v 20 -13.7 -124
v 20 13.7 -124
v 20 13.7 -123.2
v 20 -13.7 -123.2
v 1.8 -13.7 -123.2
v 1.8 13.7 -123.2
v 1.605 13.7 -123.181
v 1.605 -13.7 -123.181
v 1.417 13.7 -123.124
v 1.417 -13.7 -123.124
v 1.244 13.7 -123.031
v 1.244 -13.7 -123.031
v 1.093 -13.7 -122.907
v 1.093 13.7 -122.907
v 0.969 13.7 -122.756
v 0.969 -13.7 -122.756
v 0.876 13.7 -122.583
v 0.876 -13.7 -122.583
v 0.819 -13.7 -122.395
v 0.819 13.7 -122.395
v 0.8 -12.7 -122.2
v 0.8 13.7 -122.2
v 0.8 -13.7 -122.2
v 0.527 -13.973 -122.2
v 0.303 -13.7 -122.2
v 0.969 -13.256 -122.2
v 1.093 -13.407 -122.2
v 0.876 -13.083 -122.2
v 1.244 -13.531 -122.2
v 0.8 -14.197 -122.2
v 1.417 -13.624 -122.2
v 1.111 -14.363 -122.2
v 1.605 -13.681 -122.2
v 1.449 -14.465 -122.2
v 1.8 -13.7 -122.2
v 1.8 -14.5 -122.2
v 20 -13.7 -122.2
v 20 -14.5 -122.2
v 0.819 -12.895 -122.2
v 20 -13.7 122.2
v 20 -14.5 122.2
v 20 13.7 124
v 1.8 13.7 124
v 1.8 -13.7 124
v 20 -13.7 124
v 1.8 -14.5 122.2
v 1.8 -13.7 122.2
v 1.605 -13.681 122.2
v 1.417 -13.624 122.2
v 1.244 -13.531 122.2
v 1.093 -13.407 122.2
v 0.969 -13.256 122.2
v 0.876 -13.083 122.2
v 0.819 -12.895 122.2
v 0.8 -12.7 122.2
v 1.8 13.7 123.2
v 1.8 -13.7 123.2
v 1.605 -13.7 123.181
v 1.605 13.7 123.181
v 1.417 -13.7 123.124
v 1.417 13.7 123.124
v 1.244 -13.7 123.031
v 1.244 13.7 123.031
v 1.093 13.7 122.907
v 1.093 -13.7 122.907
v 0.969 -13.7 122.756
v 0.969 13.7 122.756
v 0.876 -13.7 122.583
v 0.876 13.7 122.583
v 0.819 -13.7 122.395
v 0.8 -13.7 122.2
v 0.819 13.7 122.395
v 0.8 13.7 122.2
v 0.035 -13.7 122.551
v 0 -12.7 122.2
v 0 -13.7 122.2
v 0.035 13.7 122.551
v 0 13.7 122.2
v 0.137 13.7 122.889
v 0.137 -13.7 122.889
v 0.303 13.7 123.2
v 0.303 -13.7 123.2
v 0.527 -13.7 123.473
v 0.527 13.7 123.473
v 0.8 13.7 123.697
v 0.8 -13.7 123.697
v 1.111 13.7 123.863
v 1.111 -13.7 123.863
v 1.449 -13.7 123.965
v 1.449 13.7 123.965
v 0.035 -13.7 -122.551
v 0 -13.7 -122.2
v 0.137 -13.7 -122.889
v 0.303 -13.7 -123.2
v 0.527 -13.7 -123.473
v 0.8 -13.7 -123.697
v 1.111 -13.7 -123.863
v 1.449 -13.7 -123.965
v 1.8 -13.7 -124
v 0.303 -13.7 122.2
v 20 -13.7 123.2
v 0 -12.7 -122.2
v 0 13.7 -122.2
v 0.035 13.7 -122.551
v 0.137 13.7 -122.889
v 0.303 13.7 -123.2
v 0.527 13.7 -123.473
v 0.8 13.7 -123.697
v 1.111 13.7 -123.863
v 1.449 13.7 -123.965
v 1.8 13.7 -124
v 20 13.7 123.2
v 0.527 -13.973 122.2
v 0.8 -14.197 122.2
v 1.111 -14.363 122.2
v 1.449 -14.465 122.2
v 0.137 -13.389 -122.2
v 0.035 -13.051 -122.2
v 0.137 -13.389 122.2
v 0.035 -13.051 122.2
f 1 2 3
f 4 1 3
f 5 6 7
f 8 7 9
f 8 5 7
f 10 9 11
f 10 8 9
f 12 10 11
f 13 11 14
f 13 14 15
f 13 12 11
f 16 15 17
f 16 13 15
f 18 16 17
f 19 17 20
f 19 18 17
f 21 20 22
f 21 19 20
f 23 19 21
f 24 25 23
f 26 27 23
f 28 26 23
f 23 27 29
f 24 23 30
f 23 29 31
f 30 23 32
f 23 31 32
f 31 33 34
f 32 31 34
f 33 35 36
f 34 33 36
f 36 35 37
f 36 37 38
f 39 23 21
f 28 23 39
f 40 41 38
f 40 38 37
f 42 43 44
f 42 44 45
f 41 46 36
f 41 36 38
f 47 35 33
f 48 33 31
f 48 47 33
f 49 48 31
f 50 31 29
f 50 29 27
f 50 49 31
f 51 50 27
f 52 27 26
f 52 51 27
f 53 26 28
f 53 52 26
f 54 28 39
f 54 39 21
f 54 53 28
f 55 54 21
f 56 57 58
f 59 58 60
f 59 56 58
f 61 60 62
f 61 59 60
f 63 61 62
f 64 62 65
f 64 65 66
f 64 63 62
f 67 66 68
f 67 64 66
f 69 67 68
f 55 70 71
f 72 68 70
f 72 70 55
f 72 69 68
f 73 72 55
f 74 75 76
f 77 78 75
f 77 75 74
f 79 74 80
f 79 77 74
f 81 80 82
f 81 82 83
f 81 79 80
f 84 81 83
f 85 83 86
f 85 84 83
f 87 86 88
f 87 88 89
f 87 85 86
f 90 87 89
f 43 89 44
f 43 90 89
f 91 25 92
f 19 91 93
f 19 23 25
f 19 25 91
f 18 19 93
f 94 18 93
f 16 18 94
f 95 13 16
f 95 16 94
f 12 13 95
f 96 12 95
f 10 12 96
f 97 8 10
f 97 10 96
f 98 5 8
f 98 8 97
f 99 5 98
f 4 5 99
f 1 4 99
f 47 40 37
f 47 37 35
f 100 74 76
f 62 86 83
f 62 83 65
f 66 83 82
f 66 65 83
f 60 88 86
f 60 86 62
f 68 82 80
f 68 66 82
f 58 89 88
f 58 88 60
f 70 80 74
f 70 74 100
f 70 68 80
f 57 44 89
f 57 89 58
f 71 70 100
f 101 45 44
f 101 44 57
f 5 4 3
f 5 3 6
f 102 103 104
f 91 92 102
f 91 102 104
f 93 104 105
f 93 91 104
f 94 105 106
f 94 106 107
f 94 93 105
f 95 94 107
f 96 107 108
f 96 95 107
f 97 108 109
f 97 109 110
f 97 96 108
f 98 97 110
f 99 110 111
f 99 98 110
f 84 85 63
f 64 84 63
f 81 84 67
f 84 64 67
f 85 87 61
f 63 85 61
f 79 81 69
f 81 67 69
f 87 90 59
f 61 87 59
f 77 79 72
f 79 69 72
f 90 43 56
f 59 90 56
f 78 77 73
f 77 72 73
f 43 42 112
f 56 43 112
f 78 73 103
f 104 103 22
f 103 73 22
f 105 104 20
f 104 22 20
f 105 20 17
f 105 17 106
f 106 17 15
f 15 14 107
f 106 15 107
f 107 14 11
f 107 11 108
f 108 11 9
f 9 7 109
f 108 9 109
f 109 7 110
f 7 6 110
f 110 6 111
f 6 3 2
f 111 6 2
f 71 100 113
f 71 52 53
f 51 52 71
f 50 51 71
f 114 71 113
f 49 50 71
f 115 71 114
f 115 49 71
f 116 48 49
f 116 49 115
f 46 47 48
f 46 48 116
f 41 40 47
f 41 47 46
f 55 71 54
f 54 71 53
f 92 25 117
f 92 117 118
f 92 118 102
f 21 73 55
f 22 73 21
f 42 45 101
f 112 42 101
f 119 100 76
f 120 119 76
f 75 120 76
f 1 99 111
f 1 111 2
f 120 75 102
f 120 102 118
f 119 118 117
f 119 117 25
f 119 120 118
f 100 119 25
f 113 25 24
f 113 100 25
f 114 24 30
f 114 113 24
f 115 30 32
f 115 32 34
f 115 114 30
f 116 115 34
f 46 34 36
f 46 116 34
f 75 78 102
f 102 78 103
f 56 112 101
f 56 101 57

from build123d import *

# Parameters (mm, degrees)
SKETCH2_W                    = 246.4
SKETCH2_H                    = 27.4
BASE_FLANGE2_DEPTH           = 0.8
EDGE_FLANGE1_STRIP_W         = 5.2
EDGE_FLANGE1_STRIP_H         = 0.8
EDGE_FLANGE1_STRIP_CUT_DEPTH = 27.4
EDGE_FLANGE1_DEPTH           = 27.4
EDGE_FLANGE2_STRIP_W         = 5.2
EDGE_FLANGE2_STRIP_H         = 0.8
EDGE_FLANGE2_STRIP_CUT_DEPTH = 27.4
EDGE_FLANGE2_DEPTH           = 27.4
EDGE_FLANGE3_STRIP_W         = 5.2
EDGE_FLANGE3_STRIP_H         = 0.8
EDGE_FLANGE3_STRIP_CUT_DEPTH = 244.4
EDGE_FLANGE3_DEPTH           = 244.4


# Sheet-metal steps are written as plain solids
with BuildPart() as part:
    # Sketch2 → Base-Flange2 (new body)
    with BuildSketch(Plane(origin=(0, 0, 0), x_dir=(0, 0, -1), z_dir=(1, 0, 0))):
        Rectangle(SKETCH2_W, SKETCH2_H)
    extrude(amount=BASE_FLANGE2_DEPTH)

    # Edge-Flange1 strip (across the edge) → Edge-Flange1 strip cut (cut)
    with BuildSketch(Plane(origin=(0.8, 13.7, 123.2), x_dir=(0, 0, -1), z_dir=(0, -1, 0))):
        with Locations((-1.6, -0.4)):
            Rectangle(EDGE_FLANGE1_STRIP_W, EDGE_FLANGE1_STRIP_H)
    extrude(amount=EDGE_FLANGE1_STRIP_CUT_DEPTH, mode=Mode.SUBTRACT)

    # Edge-Flange1 section (across the edge) → Edge-Flange1 (add)
    with BuildSketch(Plane(origin=(0.8, 13.7, 123.2), x_dir=(0, 0, -1), z_dir=(0, -1, 0))):
        with BuildLine():
            Line((-0.8, 1), (-0.8, 19.2))
            Line((-0.8, 19.2), (0, 19.2))
            Line((0, 19.2), (0, 1))
            ThreePointArc((0, 1), (0.292893219, 0.292893219), (1, 0))
            Line((1, 0), (1, -0.8))
            ThreePointArc((1, -0.8), (-0.272792206, -0.272792206), (-0.8, 1))
        make_face()
    extrude(amount=EDGE_FLANGE1_DEPTH)

    # Edge-Flange2 strip (across the edge) → Edge-Flange2 strip cut (cut)
    with BuildSketch(Plane(origin=(0.8, -13.7, -123.2), x_dir=(0, 0, 1), z_dir=(0, 1, 0))):
        with Locations((-1.6, -0.4)):
            Rectangle(EDGE_FLANGE2_STRIP_W, EDGE_FLANGE2_STRIP_H)
    extrude(amount=EDGE_FLANGE2_STRIP_CUT_DEPTH, mode=Mode.SUBTRACT)

    # Edge-Flange2 section (across the edge) → Edge-Flange2 (add)
    with BuildSketch(Plane(origin=(0.8, -13.7, -123.2), x_dir=(0, 0, 1), z_dir=(0, 1, 0))):
        with BuildLine():
            Line((-0.8, 1), (-0.8, 19.2))
            Line((-0.8, 19.2), (0, 19.2))
            Line((0, 19.2), (0, 1))
            ThreePointArc((0, 1), (0.292893219, 0.292893219), (1, 0))
            Line((1, 0), (1, -0.8))
            ThreePointArc((1, -0.8), (-0.272792206, -0.272792206), (-0.8, 1))
        make_face()
    extrude(amount=EDGE_FLANGE2_DEPTH)

    # Edge-Flange3 strip (across the edge) → Edge-Flange3 strip cut (cut)
    with BuildSketch(Plane(origin=(0.8, -13.7, 122.2), x_dir=(0, 1, 0), z_dir=(0, 0, -1))):
        with Locations((-1.6, -0.4)):
            Rectangle(EDGE_FLANGE3_STRIP_W, EDGE_FLANGE3_STRIP_H)
    extrude(amount=EDGE_FLANGE3_STRIP_CUT_DEPTH, mode=Mode.SUBTRACT)

    # Edge-Flange3 section (across the edge) → Edge-Flange3 (add)
    with BuildSketch(Plane(origin=(0.8, -13.7, 122.2), x_dir=(0, 1, 0), z_dir=(0, 0, -1))):
        with BuildLine():
            Line((-0.8, 1), (-0.8, 19.2))
            Line((-0.8, 19.2), (0, 19.2))
            Line((0, 19.2), (0, 1))
            ThreePointArc((0, 1), (0.292893219, 0.292893219), (1, 0))
            Line((1, 0), (1, -0.8))
            ThreePointArc((1, -0.8), (-0.272792206, -0.272792206), (-0.8, 1))
        make_face()
    extrude(amount=EDGE_FLANGE3_DEPTH)


solid = part.part
